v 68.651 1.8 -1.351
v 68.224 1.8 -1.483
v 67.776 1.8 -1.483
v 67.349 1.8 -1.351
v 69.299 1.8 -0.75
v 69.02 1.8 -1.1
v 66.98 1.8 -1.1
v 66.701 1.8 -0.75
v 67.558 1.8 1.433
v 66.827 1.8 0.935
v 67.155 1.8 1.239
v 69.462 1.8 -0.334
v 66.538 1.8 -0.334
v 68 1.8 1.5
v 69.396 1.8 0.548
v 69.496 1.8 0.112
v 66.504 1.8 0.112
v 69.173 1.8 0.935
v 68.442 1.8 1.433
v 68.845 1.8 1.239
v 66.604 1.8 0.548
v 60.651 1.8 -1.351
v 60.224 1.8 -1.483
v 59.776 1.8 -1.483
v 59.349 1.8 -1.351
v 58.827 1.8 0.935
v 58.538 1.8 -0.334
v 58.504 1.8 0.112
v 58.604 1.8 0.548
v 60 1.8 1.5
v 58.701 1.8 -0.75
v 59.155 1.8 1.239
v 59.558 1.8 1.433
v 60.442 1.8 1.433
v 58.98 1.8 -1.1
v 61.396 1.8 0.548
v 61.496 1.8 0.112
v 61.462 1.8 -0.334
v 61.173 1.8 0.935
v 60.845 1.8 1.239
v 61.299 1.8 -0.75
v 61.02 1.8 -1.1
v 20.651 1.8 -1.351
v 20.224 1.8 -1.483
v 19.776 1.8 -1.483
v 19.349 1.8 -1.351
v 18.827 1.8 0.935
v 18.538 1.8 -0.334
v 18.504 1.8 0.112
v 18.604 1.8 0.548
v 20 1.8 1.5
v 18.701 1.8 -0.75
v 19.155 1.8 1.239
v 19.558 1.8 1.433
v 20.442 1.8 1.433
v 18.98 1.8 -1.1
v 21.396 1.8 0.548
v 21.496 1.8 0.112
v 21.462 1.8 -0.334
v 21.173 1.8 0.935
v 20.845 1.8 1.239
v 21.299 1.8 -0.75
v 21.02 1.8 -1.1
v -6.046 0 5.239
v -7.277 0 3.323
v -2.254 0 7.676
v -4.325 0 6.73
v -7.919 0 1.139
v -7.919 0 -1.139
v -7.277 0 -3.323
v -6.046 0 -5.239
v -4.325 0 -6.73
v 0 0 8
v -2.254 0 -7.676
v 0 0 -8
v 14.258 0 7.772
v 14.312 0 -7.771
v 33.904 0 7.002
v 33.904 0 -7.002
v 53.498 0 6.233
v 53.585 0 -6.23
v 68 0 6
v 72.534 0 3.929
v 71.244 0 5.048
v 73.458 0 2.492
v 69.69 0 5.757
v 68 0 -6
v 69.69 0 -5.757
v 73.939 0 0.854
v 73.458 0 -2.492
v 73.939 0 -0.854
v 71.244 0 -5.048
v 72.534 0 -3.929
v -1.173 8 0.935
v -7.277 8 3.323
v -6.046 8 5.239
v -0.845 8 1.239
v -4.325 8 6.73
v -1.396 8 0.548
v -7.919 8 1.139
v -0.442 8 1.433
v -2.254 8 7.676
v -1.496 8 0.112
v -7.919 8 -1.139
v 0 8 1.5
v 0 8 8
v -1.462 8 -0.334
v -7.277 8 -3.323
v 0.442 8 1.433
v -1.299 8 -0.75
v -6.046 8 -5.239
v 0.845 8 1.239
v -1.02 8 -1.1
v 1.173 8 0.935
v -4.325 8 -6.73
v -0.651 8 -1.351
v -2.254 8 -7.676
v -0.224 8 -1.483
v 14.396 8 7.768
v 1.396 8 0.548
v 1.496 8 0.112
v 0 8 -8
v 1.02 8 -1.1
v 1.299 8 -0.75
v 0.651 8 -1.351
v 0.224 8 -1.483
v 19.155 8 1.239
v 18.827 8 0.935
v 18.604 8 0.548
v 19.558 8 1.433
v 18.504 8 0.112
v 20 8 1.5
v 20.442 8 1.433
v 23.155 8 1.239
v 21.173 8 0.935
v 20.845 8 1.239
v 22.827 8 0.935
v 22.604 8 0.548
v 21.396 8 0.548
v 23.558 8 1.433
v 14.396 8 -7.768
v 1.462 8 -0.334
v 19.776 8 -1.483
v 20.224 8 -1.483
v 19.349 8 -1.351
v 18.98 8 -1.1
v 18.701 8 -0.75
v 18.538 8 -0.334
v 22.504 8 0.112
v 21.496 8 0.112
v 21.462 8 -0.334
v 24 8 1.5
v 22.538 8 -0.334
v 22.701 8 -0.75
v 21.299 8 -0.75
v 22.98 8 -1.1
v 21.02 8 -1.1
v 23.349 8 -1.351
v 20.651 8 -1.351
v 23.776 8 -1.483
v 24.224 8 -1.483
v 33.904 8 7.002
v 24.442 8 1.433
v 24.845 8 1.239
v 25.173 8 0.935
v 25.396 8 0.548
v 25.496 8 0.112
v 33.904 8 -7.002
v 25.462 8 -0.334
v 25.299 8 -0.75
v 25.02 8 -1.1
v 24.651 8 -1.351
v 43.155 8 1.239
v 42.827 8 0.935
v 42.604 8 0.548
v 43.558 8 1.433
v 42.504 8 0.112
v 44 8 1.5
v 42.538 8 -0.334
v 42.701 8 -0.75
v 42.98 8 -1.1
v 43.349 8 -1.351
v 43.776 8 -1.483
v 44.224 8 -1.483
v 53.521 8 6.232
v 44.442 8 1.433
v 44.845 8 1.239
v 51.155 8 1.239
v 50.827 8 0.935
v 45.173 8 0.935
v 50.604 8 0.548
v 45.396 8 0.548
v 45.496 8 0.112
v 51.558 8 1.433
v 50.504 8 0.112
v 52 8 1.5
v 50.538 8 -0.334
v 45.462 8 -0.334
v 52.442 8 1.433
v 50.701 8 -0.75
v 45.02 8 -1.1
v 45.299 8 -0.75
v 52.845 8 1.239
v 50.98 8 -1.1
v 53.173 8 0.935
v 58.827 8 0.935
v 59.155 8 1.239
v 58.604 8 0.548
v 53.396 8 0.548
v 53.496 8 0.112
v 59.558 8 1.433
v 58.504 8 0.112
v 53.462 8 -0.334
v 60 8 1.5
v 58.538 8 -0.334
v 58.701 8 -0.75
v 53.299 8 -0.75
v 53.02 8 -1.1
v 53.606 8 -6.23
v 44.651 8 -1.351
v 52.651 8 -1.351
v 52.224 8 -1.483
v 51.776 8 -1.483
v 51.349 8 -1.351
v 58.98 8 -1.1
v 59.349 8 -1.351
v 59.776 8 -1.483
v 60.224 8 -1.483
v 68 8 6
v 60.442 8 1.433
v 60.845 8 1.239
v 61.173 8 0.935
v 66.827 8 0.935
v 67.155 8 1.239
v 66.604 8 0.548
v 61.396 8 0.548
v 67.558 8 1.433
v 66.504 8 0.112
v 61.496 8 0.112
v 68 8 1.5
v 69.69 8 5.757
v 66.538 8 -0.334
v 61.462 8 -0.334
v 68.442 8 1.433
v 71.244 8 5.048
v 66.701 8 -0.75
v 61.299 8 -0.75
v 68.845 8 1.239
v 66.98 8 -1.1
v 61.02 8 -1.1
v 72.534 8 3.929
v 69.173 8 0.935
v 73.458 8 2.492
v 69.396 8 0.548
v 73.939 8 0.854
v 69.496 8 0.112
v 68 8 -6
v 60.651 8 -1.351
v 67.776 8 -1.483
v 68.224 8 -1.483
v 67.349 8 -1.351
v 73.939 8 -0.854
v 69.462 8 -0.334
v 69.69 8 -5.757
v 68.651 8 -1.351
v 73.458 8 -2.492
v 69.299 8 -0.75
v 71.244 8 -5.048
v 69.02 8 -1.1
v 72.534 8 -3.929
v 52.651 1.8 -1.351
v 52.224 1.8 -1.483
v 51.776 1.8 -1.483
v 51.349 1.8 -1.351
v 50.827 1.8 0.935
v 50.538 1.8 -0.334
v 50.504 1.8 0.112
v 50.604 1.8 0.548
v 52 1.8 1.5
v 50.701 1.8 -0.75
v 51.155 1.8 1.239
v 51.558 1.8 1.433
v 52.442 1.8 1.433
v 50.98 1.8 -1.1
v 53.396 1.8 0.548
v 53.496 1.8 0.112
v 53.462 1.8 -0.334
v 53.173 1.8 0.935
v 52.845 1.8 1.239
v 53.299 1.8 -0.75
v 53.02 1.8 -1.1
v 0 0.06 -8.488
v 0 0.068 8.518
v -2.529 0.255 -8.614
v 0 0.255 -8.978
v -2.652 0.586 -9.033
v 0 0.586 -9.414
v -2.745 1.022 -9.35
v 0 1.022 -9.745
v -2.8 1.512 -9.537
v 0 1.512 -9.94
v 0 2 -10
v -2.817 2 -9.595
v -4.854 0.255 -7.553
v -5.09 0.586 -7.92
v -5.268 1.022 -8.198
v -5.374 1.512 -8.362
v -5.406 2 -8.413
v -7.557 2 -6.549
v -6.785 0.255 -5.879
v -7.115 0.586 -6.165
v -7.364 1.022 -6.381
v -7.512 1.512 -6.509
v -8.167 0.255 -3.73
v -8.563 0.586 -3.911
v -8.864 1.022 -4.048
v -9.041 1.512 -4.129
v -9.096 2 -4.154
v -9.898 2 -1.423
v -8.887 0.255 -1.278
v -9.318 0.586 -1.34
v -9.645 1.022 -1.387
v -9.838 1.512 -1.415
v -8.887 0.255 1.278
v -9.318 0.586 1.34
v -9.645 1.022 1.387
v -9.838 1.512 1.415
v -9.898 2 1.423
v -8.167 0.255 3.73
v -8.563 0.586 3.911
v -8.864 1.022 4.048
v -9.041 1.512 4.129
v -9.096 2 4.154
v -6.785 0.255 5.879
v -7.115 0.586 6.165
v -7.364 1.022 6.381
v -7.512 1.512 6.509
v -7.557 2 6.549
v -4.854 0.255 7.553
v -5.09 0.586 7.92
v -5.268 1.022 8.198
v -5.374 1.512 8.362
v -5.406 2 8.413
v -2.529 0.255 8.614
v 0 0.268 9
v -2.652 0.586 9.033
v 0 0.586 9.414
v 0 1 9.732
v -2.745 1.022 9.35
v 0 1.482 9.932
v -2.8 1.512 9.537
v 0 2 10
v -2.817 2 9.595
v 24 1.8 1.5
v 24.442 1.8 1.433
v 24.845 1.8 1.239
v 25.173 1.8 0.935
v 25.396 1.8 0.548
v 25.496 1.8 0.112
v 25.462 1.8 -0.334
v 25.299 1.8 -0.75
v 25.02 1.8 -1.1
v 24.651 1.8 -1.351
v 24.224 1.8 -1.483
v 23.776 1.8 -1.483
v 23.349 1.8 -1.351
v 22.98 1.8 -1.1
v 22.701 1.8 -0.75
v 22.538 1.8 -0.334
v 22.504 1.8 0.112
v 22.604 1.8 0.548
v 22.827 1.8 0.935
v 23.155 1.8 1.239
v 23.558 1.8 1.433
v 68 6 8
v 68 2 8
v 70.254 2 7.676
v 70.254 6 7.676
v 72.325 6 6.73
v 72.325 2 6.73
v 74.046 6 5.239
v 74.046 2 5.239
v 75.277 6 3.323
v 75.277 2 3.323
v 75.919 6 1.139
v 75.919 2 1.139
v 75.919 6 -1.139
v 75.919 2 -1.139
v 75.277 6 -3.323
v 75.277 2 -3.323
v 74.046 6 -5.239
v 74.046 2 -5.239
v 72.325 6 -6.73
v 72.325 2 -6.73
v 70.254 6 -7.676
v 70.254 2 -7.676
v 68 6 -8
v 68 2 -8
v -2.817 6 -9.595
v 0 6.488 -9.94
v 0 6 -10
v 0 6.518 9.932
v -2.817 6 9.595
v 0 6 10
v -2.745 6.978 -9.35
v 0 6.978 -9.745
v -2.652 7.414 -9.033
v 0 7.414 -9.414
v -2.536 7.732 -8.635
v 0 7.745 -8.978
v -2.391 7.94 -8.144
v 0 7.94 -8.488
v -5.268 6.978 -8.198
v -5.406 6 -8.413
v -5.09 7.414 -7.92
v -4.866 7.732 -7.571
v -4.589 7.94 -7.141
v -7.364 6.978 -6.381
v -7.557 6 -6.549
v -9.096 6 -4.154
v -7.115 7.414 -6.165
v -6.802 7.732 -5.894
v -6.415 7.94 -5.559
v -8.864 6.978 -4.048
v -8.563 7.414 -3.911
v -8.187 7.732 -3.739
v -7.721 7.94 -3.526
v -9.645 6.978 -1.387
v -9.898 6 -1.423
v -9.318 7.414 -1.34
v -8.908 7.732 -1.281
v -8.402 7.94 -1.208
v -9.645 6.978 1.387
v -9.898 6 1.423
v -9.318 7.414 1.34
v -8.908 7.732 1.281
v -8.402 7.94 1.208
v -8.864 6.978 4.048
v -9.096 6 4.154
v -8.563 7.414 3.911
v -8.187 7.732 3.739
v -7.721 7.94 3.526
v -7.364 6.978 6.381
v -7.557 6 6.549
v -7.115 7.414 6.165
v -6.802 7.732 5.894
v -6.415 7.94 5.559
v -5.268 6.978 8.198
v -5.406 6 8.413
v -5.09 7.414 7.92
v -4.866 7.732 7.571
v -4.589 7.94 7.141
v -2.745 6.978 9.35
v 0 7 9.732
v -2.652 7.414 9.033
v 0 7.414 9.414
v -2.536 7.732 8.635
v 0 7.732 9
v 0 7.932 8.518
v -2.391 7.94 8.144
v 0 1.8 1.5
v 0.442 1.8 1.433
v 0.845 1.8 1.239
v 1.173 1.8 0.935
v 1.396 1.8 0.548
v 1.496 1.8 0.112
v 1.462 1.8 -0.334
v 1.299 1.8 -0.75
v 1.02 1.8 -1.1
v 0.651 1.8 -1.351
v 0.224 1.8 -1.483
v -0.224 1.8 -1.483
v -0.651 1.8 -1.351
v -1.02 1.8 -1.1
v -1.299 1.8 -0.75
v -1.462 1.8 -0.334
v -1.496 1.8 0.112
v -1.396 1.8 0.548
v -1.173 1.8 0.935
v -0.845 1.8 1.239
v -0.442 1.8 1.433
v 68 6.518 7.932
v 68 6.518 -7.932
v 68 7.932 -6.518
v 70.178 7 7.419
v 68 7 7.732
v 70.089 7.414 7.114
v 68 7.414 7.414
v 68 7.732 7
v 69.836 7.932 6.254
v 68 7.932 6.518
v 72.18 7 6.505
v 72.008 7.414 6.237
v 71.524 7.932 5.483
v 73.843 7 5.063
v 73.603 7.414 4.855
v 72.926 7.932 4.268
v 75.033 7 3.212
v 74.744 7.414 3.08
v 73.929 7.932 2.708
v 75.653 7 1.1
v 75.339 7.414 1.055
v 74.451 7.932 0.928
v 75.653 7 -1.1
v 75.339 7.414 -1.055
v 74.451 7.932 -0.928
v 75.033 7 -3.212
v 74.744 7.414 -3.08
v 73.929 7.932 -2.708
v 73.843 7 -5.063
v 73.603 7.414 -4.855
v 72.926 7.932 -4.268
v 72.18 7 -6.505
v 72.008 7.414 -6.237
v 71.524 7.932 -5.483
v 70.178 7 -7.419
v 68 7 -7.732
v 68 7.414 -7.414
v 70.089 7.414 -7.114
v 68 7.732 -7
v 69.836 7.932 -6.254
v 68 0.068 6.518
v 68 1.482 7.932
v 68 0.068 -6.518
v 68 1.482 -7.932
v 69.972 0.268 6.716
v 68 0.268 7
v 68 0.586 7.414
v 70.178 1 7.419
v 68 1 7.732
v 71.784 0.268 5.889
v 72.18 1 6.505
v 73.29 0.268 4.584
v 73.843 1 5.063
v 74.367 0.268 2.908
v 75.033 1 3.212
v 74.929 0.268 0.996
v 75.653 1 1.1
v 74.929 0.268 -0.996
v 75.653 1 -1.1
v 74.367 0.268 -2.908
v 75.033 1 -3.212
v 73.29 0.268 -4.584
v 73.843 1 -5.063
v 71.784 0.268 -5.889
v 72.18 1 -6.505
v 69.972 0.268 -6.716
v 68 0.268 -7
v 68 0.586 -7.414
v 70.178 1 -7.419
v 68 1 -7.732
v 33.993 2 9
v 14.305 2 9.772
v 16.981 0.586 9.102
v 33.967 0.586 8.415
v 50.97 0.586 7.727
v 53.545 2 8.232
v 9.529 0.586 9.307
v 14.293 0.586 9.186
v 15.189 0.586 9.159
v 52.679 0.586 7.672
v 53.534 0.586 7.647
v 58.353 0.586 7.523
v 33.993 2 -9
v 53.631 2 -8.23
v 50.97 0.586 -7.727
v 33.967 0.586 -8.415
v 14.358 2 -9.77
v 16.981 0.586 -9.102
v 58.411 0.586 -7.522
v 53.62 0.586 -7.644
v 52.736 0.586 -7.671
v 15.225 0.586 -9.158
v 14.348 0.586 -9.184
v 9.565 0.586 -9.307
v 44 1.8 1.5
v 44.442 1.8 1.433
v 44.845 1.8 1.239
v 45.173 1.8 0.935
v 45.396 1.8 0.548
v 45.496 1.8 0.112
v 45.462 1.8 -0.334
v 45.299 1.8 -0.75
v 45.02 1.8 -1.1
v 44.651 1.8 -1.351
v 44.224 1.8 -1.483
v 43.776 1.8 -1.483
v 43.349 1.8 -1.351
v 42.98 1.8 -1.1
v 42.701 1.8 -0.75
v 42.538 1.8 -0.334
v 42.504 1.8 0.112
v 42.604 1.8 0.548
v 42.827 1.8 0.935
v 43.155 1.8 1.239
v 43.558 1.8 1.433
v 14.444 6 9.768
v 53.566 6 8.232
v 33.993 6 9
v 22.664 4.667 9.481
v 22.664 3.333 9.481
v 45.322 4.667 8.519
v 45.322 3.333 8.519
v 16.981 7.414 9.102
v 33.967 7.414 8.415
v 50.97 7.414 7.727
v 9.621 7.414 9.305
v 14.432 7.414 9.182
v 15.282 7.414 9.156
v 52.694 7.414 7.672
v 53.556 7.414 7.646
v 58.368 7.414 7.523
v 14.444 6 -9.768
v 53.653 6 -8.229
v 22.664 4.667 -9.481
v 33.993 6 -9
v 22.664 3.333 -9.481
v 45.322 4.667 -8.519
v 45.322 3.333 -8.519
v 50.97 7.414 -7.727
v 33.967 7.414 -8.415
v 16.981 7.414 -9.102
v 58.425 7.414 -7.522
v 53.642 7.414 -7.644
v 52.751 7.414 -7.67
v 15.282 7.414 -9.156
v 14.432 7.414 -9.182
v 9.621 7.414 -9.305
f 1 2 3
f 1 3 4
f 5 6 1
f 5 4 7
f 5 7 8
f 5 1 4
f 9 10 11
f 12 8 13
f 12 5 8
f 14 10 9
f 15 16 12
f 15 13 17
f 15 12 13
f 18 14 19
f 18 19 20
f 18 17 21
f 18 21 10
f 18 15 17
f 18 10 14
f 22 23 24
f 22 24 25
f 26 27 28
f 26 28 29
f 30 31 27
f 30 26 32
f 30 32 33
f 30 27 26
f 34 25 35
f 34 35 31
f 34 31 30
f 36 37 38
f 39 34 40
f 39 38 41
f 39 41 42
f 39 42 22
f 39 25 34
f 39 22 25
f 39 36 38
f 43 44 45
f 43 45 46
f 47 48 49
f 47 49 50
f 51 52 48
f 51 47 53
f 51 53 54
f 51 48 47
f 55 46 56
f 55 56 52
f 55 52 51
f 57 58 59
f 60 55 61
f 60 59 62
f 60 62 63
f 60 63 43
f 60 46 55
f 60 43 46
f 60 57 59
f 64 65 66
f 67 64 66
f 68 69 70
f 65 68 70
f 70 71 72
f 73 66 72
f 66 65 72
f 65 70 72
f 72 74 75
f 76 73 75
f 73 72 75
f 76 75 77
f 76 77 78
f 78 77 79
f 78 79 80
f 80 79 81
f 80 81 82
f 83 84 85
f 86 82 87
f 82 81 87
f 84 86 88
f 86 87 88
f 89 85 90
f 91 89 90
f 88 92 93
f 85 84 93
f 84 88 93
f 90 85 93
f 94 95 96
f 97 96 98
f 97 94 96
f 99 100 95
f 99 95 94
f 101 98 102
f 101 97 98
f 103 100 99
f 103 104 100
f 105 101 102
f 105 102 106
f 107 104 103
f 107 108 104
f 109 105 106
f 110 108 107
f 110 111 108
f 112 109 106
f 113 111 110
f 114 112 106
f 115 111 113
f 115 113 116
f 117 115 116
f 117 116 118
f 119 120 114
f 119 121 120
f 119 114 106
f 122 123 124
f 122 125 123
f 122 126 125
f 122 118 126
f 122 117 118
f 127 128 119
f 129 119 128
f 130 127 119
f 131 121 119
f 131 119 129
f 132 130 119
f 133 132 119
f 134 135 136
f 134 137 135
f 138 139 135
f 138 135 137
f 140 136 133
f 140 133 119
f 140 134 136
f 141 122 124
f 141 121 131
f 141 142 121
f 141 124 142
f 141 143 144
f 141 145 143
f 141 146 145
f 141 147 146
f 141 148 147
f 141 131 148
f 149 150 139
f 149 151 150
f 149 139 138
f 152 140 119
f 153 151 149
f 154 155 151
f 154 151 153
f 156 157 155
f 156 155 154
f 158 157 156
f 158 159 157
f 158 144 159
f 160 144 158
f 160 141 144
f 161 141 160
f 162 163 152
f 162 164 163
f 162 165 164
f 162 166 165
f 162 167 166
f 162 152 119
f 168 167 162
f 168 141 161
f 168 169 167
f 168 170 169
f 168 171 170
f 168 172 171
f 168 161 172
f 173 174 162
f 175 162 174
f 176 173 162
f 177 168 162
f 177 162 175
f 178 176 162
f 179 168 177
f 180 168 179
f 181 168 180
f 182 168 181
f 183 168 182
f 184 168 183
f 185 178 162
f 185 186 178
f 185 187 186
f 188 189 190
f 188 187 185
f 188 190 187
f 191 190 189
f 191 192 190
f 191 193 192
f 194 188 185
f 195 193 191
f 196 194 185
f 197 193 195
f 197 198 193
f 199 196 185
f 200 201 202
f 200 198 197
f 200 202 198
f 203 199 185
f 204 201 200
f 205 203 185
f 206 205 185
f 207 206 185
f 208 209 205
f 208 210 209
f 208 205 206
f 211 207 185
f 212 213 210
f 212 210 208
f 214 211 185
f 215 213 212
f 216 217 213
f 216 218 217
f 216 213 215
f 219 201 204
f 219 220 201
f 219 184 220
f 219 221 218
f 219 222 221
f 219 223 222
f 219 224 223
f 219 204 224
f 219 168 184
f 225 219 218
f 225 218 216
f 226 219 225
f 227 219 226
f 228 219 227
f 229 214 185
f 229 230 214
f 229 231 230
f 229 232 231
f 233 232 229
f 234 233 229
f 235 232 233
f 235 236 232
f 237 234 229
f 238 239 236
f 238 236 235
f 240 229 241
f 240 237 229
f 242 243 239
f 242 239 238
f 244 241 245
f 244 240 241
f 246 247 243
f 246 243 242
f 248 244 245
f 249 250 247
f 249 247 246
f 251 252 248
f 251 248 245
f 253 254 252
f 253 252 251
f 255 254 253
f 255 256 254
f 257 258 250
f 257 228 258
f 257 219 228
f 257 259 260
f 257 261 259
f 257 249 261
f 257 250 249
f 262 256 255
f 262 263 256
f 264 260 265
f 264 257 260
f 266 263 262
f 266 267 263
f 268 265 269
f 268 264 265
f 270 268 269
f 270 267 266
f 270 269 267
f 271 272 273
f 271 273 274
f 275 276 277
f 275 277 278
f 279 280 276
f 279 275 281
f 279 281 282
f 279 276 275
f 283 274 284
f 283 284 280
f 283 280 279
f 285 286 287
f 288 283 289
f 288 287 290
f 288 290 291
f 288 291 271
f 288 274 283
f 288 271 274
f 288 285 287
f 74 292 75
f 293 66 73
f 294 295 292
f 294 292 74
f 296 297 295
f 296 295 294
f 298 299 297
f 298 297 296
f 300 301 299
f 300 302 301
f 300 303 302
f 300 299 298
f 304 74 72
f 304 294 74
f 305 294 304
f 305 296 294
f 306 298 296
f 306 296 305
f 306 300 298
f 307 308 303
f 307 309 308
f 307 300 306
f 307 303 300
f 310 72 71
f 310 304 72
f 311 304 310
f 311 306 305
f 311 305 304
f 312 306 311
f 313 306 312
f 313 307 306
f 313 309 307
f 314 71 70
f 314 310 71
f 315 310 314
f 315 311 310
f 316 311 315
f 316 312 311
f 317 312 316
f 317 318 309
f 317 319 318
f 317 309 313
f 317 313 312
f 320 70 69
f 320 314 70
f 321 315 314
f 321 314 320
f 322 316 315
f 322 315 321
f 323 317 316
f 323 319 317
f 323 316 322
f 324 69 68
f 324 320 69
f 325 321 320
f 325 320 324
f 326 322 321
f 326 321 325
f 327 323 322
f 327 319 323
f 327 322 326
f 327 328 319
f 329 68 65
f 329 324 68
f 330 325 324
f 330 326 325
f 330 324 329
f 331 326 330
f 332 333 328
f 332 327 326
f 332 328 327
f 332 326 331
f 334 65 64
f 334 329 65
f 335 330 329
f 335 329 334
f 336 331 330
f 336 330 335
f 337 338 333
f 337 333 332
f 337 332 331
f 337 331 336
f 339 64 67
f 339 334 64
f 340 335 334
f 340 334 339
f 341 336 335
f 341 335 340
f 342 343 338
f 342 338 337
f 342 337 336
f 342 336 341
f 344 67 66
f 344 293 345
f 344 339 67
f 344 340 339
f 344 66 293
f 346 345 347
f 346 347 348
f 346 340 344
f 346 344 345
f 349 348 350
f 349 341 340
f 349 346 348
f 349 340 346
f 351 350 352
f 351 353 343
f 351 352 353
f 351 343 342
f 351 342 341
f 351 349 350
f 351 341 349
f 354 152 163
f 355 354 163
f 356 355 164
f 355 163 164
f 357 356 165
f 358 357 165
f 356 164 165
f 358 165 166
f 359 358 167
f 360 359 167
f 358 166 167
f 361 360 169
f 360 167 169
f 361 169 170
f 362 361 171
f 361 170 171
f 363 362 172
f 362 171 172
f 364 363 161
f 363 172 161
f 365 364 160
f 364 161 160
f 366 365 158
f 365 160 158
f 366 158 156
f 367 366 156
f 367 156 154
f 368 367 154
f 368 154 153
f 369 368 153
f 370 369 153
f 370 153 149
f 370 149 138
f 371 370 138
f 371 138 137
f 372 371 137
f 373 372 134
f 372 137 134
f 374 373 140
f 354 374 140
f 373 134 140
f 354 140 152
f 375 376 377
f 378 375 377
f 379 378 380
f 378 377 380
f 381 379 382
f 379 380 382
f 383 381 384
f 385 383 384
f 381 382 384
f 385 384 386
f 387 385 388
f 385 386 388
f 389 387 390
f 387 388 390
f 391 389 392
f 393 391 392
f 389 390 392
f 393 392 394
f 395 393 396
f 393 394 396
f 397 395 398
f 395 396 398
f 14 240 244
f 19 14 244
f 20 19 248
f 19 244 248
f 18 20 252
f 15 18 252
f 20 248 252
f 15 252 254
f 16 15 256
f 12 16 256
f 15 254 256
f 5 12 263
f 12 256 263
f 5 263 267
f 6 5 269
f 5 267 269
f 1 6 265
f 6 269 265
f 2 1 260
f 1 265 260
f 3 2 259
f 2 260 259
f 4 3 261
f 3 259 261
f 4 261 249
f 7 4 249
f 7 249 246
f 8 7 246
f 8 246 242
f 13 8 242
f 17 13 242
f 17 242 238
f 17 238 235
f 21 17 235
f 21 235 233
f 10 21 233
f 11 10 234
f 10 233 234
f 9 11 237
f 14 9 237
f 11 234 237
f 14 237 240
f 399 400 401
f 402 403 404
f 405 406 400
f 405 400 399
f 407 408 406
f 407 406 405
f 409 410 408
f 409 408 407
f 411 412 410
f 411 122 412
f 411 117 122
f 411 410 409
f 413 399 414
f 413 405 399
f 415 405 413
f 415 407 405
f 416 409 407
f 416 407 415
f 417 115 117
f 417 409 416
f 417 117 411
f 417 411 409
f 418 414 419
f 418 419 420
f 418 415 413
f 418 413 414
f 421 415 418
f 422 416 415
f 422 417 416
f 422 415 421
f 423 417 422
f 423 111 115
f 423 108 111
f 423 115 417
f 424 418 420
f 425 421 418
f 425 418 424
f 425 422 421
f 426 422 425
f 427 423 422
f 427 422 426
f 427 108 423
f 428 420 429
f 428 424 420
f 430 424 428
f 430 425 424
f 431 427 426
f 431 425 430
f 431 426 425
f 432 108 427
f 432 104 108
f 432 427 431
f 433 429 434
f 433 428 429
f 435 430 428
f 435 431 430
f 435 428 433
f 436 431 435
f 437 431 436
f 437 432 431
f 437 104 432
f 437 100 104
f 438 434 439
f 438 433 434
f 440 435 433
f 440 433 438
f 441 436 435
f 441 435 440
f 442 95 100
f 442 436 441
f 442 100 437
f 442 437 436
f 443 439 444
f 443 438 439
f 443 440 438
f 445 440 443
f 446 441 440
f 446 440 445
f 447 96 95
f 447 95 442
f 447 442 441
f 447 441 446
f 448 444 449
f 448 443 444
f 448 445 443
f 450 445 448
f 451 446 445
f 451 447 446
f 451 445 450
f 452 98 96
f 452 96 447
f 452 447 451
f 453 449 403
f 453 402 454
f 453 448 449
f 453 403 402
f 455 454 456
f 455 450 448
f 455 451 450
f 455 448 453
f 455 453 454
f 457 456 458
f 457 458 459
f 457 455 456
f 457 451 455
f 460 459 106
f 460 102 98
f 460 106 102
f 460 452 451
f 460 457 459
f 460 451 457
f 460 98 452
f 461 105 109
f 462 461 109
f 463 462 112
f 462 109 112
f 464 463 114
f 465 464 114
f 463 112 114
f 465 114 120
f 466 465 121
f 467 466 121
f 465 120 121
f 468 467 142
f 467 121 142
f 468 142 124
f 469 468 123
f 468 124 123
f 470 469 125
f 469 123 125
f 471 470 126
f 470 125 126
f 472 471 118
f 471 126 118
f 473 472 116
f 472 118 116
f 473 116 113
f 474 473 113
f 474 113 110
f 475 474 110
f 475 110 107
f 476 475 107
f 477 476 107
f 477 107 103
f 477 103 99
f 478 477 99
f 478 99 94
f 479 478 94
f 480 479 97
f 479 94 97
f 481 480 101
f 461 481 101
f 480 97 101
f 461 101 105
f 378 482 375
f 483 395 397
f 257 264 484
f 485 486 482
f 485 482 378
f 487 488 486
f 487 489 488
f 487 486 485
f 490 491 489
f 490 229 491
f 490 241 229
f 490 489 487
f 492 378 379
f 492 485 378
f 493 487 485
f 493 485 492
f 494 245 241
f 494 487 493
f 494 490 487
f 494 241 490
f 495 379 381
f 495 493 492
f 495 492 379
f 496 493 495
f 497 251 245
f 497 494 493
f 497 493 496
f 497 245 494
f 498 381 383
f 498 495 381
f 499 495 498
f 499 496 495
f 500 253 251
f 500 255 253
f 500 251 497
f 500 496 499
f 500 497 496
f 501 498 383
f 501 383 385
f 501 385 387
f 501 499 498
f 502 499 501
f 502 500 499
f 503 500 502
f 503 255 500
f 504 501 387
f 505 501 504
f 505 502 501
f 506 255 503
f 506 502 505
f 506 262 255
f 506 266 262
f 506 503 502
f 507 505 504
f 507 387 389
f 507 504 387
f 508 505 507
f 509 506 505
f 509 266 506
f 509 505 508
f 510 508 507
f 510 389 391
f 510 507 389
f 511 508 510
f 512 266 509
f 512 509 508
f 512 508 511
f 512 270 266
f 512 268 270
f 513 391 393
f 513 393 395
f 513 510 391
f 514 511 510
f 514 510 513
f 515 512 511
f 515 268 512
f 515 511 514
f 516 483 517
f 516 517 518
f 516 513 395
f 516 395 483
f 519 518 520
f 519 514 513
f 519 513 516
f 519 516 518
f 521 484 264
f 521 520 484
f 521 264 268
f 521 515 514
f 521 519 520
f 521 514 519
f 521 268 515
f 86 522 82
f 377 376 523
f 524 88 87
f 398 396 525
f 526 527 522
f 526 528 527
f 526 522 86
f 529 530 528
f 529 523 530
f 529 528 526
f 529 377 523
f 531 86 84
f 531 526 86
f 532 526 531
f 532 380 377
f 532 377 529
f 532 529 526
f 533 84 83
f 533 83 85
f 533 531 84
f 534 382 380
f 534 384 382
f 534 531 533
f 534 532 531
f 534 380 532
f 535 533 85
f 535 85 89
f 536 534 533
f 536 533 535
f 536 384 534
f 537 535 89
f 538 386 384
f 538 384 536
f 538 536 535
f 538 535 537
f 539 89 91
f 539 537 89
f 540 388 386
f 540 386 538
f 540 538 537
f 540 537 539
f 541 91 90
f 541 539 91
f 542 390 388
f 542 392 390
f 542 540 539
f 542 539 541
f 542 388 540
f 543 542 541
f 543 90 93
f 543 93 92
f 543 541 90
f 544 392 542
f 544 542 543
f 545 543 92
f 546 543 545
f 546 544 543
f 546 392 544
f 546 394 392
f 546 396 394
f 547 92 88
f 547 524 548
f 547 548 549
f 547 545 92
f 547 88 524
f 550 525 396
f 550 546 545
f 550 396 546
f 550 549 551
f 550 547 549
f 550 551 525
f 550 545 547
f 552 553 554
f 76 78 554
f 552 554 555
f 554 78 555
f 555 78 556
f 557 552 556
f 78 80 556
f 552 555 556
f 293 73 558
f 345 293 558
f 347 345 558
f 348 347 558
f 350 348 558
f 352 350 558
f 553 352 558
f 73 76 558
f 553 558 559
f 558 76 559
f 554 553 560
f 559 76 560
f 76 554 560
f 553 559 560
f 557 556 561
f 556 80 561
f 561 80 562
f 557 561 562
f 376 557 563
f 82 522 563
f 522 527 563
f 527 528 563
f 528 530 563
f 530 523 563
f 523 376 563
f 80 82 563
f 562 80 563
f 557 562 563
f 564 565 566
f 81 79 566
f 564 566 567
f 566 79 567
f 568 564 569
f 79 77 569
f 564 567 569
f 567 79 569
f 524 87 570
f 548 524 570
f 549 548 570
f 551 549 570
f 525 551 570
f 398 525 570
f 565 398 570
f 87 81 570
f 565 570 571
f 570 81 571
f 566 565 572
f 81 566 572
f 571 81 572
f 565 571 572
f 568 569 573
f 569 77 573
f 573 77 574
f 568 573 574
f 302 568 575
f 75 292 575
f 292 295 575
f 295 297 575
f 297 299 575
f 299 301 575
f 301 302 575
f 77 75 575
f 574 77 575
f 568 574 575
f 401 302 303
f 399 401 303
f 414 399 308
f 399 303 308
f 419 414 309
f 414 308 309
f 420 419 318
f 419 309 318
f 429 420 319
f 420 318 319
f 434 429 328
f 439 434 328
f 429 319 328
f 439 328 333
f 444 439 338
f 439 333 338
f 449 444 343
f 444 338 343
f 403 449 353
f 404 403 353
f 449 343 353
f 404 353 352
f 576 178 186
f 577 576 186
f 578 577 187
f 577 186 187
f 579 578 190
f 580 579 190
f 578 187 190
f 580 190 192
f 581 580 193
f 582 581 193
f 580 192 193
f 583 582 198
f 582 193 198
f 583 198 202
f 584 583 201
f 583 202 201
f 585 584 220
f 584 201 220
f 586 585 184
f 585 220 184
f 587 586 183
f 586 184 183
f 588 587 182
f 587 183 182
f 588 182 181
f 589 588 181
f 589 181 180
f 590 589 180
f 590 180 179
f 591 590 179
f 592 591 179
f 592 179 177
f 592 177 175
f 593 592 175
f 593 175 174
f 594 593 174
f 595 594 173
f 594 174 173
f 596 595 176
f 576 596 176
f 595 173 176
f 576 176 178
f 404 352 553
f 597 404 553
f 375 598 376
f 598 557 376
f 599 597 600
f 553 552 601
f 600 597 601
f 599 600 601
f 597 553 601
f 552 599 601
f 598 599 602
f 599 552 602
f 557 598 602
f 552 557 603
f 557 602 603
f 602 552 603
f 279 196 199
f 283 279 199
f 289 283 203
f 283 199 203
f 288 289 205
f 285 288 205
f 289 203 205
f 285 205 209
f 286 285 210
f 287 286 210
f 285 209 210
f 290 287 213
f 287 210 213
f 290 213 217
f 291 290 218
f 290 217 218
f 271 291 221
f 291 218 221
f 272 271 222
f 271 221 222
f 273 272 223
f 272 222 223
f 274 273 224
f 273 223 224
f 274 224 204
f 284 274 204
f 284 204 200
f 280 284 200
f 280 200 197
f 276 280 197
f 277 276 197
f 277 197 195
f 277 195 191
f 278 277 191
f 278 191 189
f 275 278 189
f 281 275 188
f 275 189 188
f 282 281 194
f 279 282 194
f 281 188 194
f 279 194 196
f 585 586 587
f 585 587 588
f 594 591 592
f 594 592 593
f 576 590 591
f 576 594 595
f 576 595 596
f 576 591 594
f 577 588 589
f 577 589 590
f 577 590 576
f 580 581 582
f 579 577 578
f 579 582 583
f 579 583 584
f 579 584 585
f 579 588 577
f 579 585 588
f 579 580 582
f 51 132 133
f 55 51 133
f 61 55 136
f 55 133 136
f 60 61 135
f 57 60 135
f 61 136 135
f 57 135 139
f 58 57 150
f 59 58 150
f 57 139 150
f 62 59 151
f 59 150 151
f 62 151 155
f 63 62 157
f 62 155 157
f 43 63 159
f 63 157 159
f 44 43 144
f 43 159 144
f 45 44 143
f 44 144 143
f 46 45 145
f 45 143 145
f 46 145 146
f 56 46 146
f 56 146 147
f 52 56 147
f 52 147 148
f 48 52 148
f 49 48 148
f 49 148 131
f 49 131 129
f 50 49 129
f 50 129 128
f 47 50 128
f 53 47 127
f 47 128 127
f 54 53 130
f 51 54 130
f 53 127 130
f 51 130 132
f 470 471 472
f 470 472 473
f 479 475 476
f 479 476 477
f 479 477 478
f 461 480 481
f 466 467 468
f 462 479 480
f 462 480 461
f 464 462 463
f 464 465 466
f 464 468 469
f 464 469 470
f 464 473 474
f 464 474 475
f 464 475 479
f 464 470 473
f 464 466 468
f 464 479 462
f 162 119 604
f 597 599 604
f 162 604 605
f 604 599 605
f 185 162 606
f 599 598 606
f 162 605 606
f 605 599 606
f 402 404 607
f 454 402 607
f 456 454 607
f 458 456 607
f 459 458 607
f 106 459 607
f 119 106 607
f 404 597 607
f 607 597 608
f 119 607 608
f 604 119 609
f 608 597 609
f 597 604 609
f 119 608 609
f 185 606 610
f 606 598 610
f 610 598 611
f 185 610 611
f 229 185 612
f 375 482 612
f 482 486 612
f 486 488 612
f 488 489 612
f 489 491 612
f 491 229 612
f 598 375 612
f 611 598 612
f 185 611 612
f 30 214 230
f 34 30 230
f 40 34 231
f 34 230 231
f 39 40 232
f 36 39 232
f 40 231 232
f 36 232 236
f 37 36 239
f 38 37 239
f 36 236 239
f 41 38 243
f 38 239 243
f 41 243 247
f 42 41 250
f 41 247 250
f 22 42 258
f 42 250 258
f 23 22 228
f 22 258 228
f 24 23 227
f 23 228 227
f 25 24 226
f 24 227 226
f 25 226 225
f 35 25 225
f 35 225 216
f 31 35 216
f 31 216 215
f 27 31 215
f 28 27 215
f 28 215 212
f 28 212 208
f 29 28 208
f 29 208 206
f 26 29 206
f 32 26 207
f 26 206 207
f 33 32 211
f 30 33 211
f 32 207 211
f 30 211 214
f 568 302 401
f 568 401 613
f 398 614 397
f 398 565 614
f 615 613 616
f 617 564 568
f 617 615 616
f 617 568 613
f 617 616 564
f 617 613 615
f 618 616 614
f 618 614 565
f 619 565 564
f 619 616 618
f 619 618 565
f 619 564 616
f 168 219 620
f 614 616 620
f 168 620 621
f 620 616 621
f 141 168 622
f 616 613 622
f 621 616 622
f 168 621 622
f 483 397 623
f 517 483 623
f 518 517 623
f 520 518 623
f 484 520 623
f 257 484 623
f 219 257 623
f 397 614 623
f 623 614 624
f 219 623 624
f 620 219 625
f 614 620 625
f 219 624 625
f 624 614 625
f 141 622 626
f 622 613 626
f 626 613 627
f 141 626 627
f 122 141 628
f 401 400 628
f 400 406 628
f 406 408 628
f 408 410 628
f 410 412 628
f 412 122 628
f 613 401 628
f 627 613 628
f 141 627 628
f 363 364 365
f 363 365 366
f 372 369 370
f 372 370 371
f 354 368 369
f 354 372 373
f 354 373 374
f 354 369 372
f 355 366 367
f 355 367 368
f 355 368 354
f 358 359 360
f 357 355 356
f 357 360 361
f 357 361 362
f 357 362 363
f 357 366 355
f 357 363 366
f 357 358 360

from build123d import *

# Parameters (mm, degrees)
BOSS_EXTRUDE1_DEPTH = 8
SKETCH3_R           = 1.5
CUT_EXTRUDE1_DEPTH  = 6.2
FILLET4_R           = 2
FILLET5_R           = 2


with BuildPart() as part:
    # Sketch2 → Boss-Extrude1 (new body)
    with BuildSketch(Plane(origin=(0, 0, 0), x_dir=(1, 0, 0), z_dir=(0, 1, 0))):
        with BuildLine():
            ThreePointArc((0, 10), (-10, 0), (0, -10))
            add(Edge.make_bspline(
                [(0, -10), (22.676468469, -10), (45.303936393, -8), (68, -8)],
                knots=[0, 0, 0, 0, 1, 1, 1, 1], degree=3))
            ThreePointArc((68, -8), (76, 0), (68, 8))
            add(Edge.make_bspline(
                [(0, 10), (22.676468469, 10), (45.303936393, 8), (68, 8)],
                knots=[0, 0, 0, 0, 1, 1, 1, 1], degree=3))
        make_face()
    extrude(amount=BOSS_EXTRUDE1_DEPTH)

    # Sketch3 → Cut-Extrude1 (cut)
    with BuildSketch(Plane(origin=(0, 8, 0), x_dir=(1, 0, 0), z_dir=(0, 1, 0))):
        with Locations(Location((0, 0, 0), (0, 0, 270))):
            Circle(SKETCH3_R)
        with Locations(Location((68, 0, 0), (0, 0, 270))):
            Circle(SKETCH3_R)
        with Locations(Location((20, 0, 0), (0, 0, 270))):
            Circle(SKETCH3_R)
        with Locations(Location((24, 0, 0), (0, 0, 270))):
            Circle(SKETCH3_R)
        with Locations(Location((60, 0, 0), (0, 0, 270))):
            Circle(SKETCH3_R)
        with Locations(Location((52, 0, 0), (0, 0, 270))):
            Circle(SKETCH3_R)
        with Locations(Location((44, 0, 0), (0, 0, 270))):
            Circle(SKETCH3_R)
    extrude(amount=-CUT_EXTRUDE1_DEPTH, mode=Mode.SUBTRACT)

    # Fillet4
    fillet4_edges = [part.edges().sort_by_distance(p)[0] for p in [
        (33.999990473, 8, 8.999676096),
        (76, 8, 0),
        (33.999990473, 8, -8.999676096),
        (-10, 8, 0),
    ]]
    fillet(fillet4_edges, radius=FILLET4_R)

    # Fillet5
    fillet5_edges = [part.edges().sort_by_distance(p)[0] for p in [
        (76, 0, 0),
        (33.999990473, 0, 8.999676096),
        (-10, 0, 0),
        (33.999990473, 0, -8.999676096),
    ]]
    fillet(fillet5_edges, radius=FILLET5_R)


solid = part.part
